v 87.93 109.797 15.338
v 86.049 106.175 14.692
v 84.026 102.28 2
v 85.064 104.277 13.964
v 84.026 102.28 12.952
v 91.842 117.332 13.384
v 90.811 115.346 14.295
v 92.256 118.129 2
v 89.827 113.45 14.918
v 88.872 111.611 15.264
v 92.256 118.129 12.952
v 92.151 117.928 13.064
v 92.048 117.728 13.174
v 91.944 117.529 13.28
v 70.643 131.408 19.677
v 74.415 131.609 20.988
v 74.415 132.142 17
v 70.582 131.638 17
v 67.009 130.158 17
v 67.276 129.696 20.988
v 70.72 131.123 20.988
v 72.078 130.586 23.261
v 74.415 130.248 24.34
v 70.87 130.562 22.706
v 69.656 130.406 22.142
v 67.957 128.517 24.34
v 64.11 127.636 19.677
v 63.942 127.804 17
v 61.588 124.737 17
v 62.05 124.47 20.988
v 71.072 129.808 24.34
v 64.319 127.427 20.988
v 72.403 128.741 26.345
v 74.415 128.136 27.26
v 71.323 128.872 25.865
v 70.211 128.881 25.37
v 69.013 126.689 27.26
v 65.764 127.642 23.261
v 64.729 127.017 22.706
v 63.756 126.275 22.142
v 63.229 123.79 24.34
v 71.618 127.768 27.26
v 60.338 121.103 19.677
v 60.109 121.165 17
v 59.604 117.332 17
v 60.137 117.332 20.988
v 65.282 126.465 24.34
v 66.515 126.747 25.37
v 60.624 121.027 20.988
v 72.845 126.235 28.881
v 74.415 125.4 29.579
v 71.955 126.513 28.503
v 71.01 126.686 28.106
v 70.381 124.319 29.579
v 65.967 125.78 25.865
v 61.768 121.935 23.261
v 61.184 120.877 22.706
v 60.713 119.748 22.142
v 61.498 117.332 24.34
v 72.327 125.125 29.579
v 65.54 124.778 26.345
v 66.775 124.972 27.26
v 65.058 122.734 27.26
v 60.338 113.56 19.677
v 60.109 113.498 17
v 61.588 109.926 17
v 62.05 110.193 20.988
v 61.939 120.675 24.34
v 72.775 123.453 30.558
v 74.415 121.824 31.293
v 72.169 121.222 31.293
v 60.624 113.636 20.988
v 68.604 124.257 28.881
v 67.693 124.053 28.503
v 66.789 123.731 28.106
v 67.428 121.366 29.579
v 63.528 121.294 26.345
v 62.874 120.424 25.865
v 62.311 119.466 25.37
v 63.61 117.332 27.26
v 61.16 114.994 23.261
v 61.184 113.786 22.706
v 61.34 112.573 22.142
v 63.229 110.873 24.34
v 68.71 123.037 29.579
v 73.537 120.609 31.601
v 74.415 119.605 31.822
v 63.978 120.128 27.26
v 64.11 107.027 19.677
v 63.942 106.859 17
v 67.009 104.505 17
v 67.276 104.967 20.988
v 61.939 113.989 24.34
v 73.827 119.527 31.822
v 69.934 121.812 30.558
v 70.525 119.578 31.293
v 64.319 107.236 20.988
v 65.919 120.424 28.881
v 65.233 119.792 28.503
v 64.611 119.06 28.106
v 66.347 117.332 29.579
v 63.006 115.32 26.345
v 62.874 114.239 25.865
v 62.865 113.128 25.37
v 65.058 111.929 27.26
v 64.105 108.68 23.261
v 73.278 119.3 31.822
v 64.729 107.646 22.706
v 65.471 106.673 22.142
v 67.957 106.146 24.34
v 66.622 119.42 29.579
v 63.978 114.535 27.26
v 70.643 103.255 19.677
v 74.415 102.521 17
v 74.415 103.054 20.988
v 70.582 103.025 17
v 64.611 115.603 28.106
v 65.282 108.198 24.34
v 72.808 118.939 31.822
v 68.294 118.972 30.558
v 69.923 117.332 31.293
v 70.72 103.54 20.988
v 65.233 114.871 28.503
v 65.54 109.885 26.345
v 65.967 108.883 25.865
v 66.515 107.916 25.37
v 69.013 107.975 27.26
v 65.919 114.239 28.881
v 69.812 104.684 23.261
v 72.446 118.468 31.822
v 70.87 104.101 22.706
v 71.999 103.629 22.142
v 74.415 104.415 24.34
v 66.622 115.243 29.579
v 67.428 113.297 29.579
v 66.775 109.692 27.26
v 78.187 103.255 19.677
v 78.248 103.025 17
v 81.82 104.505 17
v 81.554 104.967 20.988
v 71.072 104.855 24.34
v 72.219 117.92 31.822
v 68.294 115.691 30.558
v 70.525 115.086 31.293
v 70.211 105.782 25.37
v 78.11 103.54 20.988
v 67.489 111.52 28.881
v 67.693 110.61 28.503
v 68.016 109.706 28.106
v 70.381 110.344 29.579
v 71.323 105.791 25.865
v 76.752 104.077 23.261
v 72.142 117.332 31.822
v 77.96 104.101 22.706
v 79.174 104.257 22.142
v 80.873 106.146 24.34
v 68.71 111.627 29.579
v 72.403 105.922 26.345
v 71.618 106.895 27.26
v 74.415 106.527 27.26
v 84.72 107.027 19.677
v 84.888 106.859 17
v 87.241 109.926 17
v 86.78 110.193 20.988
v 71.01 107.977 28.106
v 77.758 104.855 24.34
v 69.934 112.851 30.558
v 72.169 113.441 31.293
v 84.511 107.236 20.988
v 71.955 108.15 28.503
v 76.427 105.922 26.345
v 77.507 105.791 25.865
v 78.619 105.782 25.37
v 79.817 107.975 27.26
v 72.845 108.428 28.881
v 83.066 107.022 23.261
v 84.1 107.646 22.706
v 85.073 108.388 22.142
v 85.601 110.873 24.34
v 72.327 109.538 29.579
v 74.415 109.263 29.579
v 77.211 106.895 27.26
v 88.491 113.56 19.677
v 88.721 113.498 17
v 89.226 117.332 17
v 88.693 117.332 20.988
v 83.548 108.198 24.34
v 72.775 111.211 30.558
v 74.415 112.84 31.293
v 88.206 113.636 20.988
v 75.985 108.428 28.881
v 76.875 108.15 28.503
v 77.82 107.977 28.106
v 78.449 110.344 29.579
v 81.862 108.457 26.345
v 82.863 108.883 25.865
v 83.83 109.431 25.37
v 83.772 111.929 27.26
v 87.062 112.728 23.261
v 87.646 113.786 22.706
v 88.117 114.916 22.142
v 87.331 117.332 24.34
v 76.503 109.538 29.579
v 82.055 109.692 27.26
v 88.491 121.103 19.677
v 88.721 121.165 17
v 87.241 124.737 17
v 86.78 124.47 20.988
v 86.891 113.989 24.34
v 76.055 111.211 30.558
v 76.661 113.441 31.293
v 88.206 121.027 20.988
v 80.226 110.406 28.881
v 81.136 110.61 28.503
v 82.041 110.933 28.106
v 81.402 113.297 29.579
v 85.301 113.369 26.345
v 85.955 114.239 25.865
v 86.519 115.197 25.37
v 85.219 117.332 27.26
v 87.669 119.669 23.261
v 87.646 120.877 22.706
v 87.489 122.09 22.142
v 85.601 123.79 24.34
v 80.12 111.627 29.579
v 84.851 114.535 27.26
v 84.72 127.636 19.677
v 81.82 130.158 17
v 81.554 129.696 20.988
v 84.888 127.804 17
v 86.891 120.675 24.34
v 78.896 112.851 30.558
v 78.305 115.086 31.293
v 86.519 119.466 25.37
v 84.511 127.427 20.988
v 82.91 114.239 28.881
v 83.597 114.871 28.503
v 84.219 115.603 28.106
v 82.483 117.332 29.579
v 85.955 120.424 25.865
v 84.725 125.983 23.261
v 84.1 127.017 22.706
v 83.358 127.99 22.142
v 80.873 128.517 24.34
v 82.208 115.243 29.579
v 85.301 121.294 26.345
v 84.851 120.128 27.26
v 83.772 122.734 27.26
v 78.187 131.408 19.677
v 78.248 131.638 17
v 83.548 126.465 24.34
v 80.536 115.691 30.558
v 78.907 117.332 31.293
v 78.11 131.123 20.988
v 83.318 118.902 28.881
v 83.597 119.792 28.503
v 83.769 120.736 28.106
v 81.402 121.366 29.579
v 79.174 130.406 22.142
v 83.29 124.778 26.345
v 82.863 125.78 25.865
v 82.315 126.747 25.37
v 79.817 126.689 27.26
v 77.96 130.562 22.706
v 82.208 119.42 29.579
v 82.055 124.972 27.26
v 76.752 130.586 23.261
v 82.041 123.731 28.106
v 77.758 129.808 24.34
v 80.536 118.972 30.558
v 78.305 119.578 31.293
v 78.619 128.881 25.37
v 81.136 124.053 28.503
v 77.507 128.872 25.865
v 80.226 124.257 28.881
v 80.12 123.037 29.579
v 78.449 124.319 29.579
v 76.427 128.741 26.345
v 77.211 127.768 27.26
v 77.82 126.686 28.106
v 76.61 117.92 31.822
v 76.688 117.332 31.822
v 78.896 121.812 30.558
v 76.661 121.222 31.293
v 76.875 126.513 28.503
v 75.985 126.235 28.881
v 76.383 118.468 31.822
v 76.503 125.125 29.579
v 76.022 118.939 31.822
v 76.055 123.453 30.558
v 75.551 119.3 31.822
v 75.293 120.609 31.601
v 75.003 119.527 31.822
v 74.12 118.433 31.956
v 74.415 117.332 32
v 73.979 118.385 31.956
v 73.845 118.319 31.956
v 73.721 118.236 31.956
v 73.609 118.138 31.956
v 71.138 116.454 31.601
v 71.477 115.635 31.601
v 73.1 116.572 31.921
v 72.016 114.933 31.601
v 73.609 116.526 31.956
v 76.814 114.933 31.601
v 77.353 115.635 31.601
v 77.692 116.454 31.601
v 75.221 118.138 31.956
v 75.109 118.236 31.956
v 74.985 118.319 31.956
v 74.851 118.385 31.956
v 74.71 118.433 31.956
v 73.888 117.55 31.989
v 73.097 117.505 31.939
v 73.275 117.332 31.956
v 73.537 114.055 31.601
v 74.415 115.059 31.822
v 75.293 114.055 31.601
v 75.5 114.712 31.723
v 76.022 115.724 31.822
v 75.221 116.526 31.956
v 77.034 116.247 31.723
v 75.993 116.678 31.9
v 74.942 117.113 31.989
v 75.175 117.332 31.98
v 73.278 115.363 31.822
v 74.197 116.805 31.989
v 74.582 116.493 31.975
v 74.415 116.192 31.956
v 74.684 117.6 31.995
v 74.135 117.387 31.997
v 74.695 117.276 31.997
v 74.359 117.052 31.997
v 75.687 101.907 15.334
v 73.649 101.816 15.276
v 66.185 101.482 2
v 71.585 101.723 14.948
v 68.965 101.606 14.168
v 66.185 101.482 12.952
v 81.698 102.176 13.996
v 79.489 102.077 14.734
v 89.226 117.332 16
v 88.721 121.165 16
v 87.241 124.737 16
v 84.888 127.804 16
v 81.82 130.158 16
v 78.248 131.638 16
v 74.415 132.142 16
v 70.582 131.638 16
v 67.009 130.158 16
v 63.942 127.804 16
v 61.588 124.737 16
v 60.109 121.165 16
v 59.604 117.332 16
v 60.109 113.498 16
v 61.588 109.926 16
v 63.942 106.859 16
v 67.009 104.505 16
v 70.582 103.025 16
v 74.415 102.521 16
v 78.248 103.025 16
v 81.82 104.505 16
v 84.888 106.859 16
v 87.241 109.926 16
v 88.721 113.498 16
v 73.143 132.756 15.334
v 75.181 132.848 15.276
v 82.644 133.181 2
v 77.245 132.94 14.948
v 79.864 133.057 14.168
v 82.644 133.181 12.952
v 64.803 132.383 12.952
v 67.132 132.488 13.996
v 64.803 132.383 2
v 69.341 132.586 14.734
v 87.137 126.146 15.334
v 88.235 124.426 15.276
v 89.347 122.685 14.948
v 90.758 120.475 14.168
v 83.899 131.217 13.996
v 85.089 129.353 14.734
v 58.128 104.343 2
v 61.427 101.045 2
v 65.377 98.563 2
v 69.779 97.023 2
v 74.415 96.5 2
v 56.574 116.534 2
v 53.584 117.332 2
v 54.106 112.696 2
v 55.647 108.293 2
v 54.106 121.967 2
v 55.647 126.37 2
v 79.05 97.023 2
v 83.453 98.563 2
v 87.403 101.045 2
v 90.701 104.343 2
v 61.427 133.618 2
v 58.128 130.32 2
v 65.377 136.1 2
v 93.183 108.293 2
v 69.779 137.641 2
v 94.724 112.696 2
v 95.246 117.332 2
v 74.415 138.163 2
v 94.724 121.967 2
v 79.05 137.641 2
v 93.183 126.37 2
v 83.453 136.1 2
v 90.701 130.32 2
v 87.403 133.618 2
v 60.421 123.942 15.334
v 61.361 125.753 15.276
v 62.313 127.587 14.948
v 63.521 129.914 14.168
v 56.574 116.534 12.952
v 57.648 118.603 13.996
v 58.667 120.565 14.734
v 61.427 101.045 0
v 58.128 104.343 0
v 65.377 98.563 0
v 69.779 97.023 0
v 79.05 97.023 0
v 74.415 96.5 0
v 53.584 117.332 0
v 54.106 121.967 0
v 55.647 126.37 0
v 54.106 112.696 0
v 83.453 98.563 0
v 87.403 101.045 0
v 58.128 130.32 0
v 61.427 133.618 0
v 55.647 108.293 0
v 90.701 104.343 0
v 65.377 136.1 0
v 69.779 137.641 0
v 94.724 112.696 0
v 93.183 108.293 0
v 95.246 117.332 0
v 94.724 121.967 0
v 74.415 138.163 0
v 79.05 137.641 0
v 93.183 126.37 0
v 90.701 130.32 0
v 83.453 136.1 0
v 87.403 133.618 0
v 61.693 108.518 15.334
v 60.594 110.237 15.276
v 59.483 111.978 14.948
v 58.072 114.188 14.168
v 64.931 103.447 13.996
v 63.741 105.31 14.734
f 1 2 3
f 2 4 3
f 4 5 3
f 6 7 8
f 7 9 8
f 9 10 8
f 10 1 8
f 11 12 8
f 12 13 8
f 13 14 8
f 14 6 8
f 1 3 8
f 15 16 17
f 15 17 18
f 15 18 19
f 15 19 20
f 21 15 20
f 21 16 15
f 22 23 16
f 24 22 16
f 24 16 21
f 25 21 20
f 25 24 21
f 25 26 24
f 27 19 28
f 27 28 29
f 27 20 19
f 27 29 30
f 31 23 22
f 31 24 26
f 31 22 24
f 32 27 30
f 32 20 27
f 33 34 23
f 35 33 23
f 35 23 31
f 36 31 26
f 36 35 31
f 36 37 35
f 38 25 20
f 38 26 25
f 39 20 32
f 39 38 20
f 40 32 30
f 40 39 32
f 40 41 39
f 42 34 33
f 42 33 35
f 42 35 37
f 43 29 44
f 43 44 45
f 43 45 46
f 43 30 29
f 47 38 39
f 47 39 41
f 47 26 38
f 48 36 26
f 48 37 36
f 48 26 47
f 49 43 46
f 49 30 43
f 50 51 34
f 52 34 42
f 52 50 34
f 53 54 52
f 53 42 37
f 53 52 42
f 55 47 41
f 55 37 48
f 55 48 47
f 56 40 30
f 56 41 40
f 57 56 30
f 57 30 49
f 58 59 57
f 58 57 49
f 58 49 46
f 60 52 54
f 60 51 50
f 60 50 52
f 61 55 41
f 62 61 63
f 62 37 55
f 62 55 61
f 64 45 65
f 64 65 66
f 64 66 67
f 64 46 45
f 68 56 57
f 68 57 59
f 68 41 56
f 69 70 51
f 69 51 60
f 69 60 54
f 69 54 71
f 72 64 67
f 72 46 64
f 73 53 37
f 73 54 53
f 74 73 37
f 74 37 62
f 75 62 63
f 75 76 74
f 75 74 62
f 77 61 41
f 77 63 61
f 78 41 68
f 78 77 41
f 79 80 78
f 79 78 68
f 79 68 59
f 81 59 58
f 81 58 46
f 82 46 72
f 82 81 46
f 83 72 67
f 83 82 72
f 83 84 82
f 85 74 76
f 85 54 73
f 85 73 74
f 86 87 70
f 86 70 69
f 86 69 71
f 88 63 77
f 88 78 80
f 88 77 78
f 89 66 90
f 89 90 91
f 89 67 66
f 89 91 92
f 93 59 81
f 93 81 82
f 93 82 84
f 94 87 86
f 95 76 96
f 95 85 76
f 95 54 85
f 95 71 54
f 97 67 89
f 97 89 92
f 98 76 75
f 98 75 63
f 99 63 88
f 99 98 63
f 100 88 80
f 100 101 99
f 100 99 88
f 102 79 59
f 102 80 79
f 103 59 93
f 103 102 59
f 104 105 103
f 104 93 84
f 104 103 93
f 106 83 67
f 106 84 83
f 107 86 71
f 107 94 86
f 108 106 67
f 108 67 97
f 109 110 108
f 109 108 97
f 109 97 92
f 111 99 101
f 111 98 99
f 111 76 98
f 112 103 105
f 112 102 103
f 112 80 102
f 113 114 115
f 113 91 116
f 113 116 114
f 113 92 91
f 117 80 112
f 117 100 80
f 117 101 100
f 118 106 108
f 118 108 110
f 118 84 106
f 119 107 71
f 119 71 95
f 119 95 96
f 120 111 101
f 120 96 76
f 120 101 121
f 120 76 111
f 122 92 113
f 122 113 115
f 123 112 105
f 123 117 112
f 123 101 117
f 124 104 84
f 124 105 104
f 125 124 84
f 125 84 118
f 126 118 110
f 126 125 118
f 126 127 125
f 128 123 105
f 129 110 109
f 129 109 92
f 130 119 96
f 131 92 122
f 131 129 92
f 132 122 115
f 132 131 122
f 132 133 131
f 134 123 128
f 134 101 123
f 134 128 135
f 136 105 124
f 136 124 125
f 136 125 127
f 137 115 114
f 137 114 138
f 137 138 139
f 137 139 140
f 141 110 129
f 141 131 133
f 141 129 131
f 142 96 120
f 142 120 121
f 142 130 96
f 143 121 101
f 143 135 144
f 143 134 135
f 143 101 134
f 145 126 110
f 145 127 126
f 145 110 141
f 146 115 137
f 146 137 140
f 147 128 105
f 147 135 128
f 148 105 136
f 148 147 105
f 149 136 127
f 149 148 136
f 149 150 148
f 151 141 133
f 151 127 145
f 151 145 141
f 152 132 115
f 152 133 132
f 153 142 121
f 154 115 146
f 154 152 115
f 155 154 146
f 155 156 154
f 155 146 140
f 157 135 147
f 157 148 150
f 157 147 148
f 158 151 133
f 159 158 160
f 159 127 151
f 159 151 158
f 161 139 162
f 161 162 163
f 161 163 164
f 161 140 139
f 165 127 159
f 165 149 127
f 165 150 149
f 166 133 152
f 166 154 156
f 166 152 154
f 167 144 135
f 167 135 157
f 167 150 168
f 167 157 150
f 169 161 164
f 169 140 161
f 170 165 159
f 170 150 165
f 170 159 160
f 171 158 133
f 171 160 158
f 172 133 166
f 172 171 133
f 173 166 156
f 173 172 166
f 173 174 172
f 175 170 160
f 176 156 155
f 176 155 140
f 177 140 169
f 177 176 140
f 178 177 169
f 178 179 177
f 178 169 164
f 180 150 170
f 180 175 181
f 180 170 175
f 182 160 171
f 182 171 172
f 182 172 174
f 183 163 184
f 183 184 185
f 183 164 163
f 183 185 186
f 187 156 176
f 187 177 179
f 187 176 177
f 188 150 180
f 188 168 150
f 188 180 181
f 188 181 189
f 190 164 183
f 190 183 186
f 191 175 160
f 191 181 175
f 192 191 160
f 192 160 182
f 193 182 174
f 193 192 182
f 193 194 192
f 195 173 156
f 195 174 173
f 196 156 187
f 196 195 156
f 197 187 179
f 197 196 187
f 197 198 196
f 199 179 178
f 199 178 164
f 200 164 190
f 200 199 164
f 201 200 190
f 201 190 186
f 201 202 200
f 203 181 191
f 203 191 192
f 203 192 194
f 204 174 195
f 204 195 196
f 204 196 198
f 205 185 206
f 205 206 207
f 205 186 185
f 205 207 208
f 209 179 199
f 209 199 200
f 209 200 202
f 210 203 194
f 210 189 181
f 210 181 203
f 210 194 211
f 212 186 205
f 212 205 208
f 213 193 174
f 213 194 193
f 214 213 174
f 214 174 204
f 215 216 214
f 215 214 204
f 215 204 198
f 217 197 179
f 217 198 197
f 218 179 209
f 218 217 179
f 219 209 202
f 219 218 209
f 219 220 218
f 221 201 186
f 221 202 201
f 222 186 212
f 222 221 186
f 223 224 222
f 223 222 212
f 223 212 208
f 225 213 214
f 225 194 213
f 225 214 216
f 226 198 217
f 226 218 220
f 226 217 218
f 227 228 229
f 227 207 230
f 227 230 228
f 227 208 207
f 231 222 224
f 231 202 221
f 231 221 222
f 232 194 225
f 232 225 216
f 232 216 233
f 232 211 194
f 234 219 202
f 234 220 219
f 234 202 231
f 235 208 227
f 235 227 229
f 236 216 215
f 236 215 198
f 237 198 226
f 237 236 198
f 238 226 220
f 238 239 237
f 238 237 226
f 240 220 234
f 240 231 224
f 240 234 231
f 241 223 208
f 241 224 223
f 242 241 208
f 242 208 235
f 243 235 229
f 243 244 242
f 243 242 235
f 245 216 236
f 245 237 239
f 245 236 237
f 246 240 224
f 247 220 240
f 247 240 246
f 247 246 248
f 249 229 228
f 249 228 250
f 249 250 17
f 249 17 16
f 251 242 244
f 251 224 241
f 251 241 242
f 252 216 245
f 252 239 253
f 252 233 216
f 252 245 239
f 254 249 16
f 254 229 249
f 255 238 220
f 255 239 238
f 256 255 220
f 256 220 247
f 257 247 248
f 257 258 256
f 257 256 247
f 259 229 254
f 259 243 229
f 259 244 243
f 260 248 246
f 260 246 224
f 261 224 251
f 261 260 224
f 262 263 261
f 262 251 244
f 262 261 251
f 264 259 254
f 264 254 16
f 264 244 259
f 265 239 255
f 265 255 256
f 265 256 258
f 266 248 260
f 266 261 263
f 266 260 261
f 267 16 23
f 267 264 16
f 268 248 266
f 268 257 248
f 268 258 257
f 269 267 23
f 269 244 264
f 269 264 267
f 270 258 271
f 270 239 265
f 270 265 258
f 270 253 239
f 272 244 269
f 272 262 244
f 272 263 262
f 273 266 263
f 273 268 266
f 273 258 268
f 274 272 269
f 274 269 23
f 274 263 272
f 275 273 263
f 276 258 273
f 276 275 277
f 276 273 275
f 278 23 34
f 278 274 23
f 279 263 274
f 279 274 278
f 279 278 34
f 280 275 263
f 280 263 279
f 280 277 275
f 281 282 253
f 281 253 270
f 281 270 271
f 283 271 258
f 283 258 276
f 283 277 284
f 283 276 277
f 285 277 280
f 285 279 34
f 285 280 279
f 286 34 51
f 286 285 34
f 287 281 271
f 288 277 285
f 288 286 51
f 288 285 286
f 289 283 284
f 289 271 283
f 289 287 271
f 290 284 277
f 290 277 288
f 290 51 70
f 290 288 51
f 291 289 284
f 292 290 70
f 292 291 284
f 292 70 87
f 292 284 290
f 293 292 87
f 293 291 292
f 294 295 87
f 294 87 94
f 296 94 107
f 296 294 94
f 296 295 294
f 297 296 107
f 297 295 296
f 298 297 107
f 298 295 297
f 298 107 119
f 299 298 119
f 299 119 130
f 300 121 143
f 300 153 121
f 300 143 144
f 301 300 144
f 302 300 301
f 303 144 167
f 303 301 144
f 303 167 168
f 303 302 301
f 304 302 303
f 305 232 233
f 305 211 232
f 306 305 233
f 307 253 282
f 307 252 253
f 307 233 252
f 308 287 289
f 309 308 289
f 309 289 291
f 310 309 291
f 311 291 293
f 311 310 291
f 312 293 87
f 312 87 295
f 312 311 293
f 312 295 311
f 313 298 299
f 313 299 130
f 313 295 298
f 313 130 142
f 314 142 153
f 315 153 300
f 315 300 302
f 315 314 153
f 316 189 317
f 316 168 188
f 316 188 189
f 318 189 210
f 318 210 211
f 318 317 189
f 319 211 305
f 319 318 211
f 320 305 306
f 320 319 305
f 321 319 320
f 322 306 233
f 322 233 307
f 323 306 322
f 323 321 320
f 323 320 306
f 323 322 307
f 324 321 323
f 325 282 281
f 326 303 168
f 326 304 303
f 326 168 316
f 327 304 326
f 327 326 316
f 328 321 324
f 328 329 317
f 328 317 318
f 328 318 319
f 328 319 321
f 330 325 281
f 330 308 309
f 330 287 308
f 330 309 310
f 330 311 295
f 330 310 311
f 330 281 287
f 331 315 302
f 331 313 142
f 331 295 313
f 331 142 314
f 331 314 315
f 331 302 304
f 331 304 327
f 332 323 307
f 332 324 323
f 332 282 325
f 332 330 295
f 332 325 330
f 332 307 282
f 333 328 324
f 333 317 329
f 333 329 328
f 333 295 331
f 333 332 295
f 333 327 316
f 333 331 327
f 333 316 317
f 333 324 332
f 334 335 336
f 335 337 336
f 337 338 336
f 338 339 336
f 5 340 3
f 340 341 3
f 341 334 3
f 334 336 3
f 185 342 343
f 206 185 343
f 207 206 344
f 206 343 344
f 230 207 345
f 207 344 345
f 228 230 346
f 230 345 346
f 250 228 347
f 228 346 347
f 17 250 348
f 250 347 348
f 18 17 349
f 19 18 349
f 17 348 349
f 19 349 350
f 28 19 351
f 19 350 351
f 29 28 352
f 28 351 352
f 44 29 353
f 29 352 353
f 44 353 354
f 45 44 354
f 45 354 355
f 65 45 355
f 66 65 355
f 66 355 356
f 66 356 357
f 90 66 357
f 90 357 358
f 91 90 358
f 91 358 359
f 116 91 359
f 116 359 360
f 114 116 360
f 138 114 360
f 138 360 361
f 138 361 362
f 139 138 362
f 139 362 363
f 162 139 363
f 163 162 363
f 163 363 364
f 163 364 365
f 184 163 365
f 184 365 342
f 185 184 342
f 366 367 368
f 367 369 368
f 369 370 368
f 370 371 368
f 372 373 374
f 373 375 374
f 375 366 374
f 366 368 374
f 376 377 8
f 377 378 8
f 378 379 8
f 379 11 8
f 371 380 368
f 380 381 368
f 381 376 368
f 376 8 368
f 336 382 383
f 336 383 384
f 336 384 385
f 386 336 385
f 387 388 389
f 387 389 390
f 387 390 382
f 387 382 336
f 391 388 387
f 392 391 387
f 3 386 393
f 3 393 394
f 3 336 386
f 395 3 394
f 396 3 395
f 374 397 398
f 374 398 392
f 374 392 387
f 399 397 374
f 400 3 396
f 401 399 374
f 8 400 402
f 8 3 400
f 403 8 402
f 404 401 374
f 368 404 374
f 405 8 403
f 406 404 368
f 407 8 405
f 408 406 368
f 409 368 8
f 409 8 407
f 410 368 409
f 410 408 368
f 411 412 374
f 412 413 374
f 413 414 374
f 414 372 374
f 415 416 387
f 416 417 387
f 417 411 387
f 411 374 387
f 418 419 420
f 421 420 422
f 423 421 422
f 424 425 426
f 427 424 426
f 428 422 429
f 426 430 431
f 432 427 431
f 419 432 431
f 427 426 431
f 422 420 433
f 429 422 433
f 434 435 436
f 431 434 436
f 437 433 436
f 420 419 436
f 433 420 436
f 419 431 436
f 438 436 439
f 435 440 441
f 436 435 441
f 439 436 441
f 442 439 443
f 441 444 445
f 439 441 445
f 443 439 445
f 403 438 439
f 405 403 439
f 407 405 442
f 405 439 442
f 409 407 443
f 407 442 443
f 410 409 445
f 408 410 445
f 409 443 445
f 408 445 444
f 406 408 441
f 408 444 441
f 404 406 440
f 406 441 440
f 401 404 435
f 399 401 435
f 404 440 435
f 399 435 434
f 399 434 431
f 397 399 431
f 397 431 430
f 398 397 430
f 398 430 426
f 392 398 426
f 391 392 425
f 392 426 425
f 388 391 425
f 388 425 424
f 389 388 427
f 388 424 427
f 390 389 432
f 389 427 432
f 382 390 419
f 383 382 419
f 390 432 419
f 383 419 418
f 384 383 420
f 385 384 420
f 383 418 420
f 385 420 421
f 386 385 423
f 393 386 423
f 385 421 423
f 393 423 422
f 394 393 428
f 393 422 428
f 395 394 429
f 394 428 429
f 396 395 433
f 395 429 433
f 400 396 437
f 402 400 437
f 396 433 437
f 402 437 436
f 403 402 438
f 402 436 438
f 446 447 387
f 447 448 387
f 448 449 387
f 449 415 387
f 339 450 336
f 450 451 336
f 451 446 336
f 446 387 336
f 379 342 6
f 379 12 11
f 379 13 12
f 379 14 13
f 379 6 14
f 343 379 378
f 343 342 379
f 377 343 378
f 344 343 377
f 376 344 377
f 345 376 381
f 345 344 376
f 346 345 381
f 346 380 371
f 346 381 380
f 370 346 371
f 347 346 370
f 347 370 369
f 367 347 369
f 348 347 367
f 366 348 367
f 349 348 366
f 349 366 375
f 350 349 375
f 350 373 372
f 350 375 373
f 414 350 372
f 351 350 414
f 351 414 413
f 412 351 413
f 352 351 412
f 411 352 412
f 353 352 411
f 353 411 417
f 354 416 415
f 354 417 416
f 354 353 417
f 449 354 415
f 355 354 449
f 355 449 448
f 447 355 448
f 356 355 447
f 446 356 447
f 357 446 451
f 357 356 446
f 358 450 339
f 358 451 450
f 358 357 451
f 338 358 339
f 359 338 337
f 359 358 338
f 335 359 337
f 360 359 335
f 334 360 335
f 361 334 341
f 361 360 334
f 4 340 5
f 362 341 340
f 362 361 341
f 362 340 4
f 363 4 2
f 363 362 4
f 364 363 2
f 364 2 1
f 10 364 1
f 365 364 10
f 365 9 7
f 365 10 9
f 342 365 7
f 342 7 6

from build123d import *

# Parameters (mm, degrees)
SKETCH2_R           = 20.831287801
BOSS_EXTRUDE1_DEPTH = 2
BOSS_EXTRUDE2_DEPTH = 14
SKETCH4_R           = 20.916131801
SKETCH4_R_2         = 14.810913562
CUT_EXTRUDE1_DEPTH  = 14
CUT_EXTRUDE1_DRAFT  = -45
SKETCH5_R           = 14.810913562
BOSS_EXTRUDE3_DEPTH = 1
DOME1_FACE_RADIUS   = 14.810913562
DOME1_HEIGHT        = 15


with BuildPart() as part:
    # Sketch2 → Boss-Extrude1 (new body)
    with BuildSketch(Plane.XY):
        with Locations((74.414862174, 117.331579563)):
            Circle(SKETCH2_R)
    extrude(amount=BOSS_EXTRUDE1_DEPTH)

    # Sketch3 → Boss-Extrude2 (add)
    with BuildSketch(Plane.XY.offset(2)):
        Polygon((82.644465075, 133.181309802), (64.803394594, 132.383489858), (56.573791693, 116.533759619), (66.185259272, 101.481849324), (84.026329753, 102.279669268), (92.255932654, 118.129399507), align=None)
    extrude(amount=BOSS_EXTRUDE2_DEPTH)


with BuildPart() as cut_extrude1_tool:
    # Sketch4 → Cut-Extrude1 (with draft: the straight prism first)
    with BuildSketch(Plane.XY.offset(16)):
        with Locations((74.414862174, 117.331579563)):
            Circle(SKETCH4_R)
        with Locations((74.414862174, 117.331579563)):
            Circle(SKETCH4_R_2, mode=Mode.SUBTRACT)
    extrude(amount=-CUT_EXTRUDE1_DEPTH)
    # Cut-Extrude1: the draft: its side faces are tilted about the plane it starts from
    cut_extrude1_sides = [cut_extrude1_tool.faces().sort_by_distance(p)[0] for p in [
        (53.498730373, 117.331579563, 9),
        (59.603948612, 117.331579563, 9),
    ]]
    draft(cut_extrude1_sides, Plane.XY.offset(16), CUT_EXTRUDE1_DRAFT)


with BuildPart() as part_1:
    add(part.part)

    # Cut-Extrude1: cut by cut_extrude1_tool
    add(cut_extrude1_tool.part, mode=Mode.SUBTRACT)

    # Sketch5 → Boss-Extrude3 (add)
    with BuildSketch(Plane.XY.offset(16)):
        with Locations((74.414862174, 117.331579563)):
            Circle(SKETCH5_R)
    extrude(amount=BOSS_EXTRUDE3_DEPTH)

    # Dome1: an elliptical dome of height H over a round flat face of radius A is half a spheroid: the quarter ellipse of half axes A and H revolved about the face's axis
    with BuildSketch(Plane((74.414862174, 117.331579563, 17), x_dir=(0, 1, 0), z_dir=(1, 0, 0)), mode=Mode.PRIVATE) as dome1_quarter:
        Ellipse(DOME1_FACE_RADIUS, DOME1_HEIGHT)
        Rectangle(DOME1_FACE_RADIUS, DOME1_HEIGHT, align=(Align.MIN, Align.MIN), mode=Mode.INTERSECT)
    revolve(dome1_quarter.sketch, axis=Axis((74.414862174, 117.331579563, 17), (0, 0, 1)))


solid = part_1.part
